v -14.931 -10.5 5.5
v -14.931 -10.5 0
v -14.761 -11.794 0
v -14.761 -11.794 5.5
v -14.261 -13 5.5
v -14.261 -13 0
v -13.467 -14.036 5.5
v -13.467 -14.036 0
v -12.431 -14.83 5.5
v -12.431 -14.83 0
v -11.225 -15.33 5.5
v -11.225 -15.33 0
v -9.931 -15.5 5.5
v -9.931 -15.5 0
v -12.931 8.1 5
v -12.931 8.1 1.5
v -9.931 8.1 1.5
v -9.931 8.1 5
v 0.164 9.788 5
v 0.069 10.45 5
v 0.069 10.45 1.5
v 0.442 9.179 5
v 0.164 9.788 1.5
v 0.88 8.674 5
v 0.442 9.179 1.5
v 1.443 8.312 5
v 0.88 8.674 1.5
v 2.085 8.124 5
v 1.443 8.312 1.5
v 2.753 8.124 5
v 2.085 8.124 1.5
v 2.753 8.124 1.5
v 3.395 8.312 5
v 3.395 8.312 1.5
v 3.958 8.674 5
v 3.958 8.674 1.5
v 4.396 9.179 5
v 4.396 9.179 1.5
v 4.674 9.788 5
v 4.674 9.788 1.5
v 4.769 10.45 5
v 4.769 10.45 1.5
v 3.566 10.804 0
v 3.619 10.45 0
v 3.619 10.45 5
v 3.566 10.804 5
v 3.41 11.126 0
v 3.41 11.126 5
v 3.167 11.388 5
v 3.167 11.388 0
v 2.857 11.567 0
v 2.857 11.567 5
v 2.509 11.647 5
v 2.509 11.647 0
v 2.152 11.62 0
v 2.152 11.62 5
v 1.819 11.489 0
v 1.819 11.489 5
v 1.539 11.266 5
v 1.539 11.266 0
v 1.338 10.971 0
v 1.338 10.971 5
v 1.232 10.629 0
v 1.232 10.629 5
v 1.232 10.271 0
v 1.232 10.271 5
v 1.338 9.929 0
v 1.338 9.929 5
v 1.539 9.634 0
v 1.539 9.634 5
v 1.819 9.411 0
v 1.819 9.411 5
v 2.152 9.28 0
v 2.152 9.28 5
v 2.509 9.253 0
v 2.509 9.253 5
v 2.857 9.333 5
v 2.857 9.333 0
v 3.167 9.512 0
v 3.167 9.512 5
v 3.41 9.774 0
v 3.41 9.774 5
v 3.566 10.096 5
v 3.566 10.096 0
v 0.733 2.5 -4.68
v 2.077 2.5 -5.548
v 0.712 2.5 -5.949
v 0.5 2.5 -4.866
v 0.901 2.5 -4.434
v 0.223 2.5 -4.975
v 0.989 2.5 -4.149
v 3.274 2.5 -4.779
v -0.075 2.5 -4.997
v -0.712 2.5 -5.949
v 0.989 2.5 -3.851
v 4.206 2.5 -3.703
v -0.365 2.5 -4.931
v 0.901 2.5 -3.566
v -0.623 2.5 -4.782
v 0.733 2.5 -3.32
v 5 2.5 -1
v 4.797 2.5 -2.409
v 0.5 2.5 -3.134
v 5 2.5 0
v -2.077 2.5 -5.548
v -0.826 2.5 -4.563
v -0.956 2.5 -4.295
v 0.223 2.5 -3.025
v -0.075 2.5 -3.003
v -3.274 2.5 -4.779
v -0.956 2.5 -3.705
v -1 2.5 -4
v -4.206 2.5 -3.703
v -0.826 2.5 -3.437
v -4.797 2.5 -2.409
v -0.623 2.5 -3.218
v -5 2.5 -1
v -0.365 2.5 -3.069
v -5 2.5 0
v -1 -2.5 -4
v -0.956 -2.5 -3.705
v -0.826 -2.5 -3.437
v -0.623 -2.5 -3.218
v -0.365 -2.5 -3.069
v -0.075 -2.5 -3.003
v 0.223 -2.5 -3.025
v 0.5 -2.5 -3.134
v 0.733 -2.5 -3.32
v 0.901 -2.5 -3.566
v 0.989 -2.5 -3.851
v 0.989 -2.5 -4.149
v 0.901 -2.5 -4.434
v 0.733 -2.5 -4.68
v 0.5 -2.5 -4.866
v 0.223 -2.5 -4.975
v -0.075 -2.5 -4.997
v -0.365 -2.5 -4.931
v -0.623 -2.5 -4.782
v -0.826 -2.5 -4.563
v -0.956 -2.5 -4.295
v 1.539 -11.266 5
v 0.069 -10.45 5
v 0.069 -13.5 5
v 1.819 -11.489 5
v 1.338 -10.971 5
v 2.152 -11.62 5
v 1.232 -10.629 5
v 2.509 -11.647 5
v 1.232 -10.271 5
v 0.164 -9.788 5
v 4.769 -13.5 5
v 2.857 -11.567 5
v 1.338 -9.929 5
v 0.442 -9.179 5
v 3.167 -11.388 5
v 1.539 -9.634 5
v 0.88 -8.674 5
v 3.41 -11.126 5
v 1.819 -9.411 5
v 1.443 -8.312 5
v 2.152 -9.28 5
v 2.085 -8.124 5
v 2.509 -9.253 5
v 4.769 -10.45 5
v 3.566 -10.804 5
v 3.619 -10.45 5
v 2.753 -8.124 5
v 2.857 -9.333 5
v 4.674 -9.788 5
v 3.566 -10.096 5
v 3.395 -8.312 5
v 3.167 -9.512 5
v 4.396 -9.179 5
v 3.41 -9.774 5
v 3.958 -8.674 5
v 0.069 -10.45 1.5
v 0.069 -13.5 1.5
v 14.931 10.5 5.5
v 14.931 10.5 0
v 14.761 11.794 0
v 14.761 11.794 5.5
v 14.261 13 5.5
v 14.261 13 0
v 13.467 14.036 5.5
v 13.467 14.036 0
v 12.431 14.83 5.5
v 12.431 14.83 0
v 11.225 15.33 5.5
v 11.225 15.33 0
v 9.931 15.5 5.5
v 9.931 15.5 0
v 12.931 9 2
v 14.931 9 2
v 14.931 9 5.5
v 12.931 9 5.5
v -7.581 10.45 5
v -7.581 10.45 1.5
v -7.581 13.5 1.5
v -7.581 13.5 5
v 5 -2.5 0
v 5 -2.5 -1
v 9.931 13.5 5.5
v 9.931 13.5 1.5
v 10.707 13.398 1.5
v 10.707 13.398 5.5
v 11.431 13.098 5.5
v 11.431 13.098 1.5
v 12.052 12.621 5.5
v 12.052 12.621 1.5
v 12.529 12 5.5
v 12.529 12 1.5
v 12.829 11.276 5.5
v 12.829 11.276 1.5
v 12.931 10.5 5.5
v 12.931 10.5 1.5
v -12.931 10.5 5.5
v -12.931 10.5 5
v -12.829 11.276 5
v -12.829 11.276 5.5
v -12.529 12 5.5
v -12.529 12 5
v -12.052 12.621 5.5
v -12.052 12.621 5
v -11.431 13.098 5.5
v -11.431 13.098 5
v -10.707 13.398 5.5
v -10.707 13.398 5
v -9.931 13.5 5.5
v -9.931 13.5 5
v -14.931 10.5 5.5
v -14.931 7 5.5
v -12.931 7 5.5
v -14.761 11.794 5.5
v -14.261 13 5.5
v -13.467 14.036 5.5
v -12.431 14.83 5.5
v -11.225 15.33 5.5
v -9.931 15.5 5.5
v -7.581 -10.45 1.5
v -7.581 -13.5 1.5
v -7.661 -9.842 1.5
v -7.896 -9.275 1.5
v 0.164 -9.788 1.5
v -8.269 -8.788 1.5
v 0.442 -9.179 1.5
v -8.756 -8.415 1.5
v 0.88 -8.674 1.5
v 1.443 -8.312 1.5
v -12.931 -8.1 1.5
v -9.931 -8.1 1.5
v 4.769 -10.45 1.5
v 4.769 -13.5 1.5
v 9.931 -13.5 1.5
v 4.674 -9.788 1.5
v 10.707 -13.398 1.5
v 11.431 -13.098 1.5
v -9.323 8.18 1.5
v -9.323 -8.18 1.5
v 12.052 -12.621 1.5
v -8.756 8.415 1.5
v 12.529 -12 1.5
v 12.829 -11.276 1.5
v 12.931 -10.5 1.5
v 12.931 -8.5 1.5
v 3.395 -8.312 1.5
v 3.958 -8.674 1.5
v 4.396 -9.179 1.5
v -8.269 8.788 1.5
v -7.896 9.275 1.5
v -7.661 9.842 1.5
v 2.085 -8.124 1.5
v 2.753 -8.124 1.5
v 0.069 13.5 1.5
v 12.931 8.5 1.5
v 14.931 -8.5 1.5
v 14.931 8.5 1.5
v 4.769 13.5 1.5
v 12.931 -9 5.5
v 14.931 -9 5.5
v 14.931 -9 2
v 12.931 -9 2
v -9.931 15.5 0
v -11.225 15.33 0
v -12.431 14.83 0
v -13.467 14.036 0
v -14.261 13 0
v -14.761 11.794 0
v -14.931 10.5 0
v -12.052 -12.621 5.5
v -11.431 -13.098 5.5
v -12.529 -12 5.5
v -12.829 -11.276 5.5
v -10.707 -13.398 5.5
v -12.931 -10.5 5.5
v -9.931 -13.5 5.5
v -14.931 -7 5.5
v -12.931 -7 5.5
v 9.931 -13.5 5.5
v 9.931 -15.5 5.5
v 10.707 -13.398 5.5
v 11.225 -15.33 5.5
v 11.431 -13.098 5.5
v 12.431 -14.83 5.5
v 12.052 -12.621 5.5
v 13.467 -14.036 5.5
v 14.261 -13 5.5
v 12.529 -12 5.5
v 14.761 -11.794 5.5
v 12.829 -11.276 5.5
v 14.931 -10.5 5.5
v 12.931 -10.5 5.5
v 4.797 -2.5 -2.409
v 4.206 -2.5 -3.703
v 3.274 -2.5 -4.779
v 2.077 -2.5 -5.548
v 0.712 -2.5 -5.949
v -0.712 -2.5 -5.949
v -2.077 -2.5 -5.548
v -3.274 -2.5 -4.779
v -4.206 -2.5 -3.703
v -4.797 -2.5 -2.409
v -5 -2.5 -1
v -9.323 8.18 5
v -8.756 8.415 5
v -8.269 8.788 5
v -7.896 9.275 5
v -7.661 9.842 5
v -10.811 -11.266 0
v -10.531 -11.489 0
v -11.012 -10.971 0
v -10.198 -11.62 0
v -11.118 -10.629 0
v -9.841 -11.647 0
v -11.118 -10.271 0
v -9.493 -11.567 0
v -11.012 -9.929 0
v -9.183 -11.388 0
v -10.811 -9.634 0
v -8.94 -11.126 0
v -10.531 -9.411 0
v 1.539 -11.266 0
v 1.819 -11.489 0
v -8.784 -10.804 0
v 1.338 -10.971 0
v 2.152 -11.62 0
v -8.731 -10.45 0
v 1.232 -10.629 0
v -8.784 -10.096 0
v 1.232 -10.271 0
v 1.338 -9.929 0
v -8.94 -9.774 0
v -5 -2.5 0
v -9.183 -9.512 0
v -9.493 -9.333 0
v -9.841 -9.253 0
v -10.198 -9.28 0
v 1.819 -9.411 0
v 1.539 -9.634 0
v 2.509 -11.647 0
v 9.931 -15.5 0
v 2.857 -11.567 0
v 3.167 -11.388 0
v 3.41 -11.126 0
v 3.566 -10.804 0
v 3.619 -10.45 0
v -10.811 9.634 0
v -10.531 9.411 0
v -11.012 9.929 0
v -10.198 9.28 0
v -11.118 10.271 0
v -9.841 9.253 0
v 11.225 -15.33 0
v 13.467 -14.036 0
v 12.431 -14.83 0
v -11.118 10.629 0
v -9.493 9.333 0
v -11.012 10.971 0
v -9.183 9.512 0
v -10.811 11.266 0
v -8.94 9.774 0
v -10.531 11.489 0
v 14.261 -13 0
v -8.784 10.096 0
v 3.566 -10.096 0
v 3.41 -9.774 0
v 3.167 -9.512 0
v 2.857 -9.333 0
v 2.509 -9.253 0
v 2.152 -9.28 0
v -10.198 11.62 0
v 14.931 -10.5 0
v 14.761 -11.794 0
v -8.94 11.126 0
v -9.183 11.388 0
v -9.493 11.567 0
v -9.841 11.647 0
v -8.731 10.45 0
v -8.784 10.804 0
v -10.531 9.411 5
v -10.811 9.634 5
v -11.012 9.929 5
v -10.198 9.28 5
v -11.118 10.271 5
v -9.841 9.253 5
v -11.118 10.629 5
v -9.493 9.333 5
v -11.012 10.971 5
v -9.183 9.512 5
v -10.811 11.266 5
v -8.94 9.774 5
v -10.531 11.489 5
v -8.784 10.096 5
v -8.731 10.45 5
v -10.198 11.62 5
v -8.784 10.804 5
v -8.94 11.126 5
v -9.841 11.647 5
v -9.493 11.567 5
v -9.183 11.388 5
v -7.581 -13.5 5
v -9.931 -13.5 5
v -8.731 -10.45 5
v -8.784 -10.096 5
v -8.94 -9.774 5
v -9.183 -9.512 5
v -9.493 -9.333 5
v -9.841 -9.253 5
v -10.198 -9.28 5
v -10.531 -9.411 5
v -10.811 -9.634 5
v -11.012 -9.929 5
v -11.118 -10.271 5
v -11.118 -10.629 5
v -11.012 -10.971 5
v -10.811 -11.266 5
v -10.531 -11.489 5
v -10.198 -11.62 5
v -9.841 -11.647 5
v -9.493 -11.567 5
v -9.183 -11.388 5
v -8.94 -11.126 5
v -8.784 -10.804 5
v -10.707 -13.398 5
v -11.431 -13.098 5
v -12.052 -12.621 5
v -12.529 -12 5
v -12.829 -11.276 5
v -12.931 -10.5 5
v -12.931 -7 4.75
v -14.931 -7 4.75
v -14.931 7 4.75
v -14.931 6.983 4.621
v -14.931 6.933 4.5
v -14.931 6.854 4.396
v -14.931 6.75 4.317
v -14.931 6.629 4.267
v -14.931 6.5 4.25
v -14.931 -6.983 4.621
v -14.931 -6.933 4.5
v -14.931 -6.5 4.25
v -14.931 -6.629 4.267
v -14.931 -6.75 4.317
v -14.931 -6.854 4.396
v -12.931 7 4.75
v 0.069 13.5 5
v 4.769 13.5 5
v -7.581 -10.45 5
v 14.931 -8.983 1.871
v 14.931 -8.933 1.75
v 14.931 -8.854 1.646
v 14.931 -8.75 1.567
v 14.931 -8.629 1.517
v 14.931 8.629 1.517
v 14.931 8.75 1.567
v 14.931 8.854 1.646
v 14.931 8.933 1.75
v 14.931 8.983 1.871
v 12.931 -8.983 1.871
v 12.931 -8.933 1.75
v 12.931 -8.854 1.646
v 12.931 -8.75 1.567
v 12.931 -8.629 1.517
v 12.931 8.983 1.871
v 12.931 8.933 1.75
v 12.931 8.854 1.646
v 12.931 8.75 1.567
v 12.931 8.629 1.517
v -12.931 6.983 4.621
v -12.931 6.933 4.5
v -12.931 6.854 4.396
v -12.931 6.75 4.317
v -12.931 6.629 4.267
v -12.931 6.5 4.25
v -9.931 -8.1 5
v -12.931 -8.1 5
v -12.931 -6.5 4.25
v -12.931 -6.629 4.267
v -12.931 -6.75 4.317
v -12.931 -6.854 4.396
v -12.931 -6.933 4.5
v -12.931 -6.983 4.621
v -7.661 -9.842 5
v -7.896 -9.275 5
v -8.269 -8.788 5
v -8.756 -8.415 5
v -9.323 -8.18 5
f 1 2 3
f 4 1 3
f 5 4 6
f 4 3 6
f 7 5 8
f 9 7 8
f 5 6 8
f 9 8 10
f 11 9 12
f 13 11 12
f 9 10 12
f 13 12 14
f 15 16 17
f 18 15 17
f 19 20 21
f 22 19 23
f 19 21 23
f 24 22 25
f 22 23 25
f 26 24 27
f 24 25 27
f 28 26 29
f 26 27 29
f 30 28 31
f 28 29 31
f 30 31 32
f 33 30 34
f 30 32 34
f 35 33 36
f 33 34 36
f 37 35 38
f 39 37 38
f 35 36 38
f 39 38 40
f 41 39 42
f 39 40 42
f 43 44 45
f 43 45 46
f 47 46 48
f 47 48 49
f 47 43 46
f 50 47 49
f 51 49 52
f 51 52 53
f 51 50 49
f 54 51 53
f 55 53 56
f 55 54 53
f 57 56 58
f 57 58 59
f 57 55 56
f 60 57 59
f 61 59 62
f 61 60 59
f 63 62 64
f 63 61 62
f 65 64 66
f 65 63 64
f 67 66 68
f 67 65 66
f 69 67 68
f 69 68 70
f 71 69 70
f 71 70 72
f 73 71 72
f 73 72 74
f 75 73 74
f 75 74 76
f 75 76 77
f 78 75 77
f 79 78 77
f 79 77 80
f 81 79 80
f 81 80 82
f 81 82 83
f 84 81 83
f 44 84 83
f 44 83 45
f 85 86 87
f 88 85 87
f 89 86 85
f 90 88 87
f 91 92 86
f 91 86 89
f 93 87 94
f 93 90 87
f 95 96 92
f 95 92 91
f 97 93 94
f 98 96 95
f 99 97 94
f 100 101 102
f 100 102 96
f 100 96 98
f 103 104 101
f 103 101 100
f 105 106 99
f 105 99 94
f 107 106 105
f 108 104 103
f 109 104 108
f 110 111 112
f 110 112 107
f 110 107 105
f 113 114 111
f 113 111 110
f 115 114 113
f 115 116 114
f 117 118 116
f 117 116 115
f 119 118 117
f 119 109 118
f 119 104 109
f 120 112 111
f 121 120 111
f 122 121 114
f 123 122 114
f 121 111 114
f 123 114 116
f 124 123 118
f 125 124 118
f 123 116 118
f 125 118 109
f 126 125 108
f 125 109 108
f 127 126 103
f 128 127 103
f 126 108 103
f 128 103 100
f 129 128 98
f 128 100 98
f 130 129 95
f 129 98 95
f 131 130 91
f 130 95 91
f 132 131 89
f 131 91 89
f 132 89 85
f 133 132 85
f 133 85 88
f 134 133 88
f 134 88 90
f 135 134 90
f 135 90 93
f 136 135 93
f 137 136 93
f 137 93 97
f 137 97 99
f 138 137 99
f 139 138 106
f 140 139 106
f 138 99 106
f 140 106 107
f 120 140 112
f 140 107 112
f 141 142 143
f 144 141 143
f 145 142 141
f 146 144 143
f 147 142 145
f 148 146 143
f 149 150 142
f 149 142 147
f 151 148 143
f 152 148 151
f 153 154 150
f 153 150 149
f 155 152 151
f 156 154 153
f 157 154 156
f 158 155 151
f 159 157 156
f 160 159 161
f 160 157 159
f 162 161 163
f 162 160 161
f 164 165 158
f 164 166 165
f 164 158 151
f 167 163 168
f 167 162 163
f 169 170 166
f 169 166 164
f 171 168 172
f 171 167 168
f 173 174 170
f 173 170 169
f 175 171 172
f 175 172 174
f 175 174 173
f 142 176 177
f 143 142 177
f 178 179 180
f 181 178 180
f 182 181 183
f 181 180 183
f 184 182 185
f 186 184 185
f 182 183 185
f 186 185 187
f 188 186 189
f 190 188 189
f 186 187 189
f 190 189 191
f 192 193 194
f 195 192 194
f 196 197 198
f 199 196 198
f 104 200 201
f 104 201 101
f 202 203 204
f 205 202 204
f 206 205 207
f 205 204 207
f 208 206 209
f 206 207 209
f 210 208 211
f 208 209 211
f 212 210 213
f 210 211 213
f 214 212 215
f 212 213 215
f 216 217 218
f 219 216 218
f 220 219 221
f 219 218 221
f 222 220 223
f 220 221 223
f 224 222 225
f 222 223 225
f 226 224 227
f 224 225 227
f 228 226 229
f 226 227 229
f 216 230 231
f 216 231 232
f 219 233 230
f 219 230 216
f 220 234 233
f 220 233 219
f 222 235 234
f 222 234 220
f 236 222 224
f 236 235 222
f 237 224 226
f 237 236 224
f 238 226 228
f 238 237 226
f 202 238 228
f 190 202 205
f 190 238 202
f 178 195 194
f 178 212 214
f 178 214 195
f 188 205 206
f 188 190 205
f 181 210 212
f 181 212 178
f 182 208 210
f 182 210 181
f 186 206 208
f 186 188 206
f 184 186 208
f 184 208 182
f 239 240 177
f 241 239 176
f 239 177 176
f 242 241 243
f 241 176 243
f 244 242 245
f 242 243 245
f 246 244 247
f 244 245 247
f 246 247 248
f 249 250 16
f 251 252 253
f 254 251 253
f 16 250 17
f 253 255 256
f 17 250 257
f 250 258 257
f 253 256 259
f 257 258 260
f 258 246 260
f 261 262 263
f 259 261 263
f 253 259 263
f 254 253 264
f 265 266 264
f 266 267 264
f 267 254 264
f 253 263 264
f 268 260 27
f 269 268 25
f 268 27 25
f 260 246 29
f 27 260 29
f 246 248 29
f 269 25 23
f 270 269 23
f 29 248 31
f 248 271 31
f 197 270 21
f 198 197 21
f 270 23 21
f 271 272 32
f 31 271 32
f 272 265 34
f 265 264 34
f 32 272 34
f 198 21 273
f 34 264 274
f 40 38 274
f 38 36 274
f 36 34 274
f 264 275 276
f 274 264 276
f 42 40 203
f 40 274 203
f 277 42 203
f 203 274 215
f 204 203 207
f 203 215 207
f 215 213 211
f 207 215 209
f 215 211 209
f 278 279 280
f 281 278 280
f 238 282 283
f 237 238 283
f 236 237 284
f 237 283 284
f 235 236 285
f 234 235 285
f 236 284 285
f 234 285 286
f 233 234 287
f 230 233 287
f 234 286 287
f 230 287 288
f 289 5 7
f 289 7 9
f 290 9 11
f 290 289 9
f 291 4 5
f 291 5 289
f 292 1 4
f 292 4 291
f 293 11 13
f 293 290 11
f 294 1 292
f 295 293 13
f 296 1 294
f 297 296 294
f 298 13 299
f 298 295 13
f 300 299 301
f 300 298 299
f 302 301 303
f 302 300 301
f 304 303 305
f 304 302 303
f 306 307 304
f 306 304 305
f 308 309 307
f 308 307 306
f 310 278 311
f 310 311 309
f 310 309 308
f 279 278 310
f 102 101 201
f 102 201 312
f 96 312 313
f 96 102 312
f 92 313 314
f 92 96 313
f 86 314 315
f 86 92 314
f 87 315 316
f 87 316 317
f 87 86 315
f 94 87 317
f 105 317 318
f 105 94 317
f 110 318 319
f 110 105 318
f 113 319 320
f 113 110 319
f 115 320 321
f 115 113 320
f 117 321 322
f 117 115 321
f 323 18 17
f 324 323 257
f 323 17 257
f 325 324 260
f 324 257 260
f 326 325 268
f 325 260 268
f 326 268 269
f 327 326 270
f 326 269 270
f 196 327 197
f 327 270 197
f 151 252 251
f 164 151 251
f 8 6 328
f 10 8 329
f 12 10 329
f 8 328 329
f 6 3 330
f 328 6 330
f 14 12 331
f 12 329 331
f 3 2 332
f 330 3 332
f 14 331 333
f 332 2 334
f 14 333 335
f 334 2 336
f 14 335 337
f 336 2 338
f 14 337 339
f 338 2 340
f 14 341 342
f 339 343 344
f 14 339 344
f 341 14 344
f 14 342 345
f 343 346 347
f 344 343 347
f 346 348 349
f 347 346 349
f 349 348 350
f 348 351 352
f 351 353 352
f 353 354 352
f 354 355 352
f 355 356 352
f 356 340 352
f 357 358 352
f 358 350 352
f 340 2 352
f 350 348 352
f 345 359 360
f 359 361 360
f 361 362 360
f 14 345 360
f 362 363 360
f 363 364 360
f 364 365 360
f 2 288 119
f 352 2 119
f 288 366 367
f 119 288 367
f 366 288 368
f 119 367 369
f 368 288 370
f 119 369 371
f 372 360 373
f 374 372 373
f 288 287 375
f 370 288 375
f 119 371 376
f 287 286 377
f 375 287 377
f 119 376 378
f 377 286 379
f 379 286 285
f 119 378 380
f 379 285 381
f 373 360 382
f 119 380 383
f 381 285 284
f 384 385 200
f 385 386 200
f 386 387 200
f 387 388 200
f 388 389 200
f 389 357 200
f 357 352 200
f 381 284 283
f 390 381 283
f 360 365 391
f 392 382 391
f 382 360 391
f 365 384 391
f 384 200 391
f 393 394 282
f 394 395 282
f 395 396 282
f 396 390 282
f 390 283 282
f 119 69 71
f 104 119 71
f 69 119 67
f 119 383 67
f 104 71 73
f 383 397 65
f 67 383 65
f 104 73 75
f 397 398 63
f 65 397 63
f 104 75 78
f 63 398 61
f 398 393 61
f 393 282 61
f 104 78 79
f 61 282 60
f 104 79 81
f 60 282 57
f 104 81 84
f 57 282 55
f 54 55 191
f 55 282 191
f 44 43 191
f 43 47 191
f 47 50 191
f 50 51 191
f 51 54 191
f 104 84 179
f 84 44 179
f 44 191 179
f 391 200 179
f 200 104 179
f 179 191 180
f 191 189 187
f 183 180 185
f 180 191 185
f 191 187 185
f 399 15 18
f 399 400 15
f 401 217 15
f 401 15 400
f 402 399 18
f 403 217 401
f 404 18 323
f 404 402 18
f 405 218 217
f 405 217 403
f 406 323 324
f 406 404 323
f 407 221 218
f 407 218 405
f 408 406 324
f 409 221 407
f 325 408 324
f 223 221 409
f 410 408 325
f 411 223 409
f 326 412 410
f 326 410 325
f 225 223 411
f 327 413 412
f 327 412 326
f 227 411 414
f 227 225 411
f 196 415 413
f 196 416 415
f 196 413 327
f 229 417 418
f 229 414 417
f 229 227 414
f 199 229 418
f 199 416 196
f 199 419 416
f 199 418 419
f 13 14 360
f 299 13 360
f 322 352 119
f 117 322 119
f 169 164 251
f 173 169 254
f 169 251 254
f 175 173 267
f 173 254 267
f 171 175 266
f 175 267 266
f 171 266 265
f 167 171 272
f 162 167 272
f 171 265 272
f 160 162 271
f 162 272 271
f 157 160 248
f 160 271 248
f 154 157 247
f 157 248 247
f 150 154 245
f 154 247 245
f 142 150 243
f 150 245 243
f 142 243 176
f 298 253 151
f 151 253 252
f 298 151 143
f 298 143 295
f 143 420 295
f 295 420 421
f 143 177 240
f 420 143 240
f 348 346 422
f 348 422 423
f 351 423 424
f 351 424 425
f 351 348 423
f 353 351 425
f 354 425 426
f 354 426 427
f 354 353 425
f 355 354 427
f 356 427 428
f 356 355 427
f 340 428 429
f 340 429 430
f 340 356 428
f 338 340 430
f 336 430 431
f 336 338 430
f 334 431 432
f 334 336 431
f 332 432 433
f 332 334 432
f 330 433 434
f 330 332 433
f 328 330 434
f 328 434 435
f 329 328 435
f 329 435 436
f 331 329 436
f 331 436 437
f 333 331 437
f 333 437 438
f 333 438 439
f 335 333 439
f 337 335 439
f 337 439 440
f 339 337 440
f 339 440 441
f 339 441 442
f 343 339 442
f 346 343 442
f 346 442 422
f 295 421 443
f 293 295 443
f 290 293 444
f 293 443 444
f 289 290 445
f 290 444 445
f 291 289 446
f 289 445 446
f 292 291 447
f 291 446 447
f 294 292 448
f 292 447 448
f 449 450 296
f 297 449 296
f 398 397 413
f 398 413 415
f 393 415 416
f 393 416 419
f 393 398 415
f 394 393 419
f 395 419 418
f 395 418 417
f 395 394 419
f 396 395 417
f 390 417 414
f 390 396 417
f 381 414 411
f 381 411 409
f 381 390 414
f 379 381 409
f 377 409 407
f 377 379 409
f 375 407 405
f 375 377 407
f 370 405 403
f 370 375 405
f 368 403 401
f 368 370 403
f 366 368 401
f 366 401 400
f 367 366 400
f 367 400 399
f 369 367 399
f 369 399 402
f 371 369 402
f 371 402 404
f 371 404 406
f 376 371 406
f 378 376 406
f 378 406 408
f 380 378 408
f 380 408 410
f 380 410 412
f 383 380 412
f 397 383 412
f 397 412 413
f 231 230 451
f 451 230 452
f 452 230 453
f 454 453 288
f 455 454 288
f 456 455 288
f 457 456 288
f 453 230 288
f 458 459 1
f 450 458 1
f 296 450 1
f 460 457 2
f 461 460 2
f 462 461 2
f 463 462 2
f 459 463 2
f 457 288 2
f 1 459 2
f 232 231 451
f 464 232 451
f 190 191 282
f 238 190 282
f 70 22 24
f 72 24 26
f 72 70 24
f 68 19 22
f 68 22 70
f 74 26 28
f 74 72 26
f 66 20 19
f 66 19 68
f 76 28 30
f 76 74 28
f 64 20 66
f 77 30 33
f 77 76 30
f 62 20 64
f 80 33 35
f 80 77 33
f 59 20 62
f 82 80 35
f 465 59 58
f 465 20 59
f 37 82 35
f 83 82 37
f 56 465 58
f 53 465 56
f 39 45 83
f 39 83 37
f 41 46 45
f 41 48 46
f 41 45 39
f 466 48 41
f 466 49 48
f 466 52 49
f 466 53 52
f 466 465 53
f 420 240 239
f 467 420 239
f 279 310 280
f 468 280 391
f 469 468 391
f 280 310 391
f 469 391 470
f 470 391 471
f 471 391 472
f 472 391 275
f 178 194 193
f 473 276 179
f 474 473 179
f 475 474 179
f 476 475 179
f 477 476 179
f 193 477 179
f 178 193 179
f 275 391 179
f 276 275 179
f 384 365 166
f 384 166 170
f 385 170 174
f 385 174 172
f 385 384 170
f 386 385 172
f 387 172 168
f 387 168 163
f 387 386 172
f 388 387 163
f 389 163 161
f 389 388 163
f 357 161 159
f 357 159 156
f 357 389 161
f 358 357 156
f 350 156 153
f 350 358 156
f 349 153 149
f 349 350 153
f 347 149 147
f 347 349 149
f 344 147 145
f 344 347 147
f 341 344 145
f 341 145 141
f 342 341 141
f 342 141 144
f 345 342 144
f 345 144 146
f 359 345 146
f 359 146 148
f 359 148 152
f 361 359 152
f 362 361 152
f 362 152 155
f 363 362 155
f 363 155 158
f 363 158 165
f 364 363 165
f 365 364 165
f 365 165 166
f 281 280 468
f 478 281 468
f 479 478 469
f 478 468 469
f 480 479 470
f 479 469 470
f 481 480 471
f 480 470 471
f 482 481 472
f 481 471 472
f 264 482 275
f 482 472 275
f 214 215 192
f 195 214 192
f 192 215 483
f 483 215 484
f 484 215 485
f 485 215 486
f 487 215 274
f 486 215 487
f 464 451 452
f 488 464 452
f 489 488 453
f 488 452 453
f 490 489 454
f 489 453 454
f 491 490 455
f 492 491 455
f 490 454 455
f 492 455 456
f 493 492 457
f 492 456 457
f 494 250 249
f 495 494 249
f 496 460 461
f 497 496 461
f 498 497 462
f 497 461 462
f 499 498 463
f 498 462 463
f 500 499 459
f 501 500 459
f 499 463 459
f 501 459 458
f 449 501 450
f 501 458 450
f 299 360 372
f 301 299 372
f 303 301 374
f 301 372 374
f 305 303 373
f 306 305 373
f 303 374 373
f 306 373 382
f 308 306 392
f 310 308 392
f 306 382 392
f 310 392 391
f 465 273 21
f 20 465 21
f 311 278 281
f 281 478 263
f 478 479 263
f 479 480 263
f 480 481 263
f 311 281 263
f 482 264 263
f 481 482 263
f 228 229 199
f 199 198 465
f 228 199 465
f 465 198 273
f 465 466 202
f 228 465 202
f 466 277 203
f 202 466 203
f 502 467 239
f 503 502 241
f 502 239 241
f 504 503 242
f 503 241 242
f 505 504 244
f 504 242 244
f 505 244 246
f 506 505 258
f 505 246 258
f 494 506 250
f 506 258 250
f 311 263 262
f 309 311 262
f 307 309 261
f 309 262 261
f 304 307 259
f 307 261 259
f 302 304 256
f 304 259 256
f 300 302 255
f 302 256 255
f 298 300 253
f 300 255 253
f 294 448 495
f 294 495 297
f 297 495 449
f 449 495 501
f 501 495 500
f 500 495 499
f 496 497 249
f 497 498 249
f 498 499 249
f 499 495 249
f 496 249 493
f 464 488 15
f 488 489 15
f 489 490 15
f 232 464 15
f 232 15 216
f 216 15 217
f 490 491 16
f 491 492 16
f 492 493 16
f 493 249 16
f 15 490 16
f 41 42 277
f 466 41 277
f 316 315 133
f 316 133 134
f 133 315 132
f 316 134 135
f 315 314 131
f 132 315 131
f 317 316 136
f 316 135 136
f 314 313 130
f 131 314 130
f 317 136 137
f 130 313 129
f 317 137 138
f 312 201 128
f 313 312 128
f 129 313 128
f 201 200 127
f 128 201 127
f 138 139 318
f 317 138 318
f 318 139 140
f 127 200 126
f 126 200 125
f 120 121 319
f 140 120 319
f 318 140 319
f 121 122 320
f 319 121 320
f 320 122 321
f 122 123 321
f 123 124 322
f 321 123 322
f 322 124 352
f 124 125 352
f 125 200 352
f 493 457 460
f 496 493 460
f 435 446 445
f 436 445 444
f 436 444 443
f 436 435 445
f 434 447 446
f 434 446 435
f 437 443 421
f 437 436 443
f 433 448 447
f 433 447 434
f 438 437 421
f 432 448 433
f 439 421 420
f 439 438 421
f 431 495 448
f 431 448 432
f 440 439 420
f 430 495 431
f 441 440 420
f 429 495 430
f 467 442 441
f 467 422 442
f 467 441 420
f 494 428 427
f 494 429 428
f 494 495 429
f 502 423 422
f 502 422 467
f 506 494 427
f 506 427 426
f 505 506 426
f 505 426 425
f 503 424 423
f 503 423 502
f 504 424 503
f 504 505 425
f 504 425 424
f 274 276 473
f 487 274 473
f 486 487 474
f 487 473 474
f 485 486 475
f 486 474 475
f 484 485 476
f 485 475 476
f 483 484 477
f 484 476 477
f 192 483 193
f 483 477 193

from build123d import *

# Parameters (mm, degrees)
F0_R      = 1.2
F1_DEPTH  = 1.5
F2_DEPTH  = 5
F3_DEPTH  = 5.5
F5_DEPTH  = 2
F7_DEPTH  = 2
F8_W      = 10
F8_H      = 5
F9_DEPTH  = 1
F10_R     = 1
F11_DEPTH = 5


# Not quite as in the source:
# - a feature names something its author has since deleted; it is built from what else it names


with BuildPart() as f1:
    # F0 (on Top) → F1 (new body)
    with BuildSketch(Plane.XY):
        with BuildLine():
            Line((14.9310000289, -10.5), (14.9310000289, 10.5))
            ThreePointArc((14.9310000289, 10.5), (13.4665339264, 14.0355339264), (9.931, 15.5000000289))
            Line((9.931, 15.5000000289), (-9.931, 15.5000000289))
            ThreePointArc((-9.931, 15.5000000289), (-13.4665339264, 14.0355339264), (-14.9310000289, 10.5))
            Line((-14.9310000289, 10.5), (-14.9310000289, -10.5))
            ThreePointArc((-14.9310000289, -10.5), (-13.4665339264, -14.0355339264), (-9.931, -15.5000000289))
            Line((-9.931, -15.5000000289), (9.931, -15.5000000289))
            ThreePointArc((9.931, -15.5000000289), (13.4665339264, -14.0355339264), (14.9310000289, -10.5))
        make_face()
        with BuildLine():
            Line((-9.931, 13.5000000289), (-7.581, 13.5000000289))
            Line((-7.581, 13.5000000289), (0.069, 13.5000000289))
            Line((0.069, 13.5000000289), (4.769, 13.5000000289))
            Line((4.769, 13.5000000289), (9.931, 13.5000000289))
            ThreePointArc((9.931, 13.5000000289), (12.052320364, 12.621320364), (12.9310000289, 10.5))
            Line((12.9310000289, 10.5), (12.9310000289, -10.5))
            ThreePointArc((12.9310000289, -10.5), (12.052320364, -12.621320364), (9.931, -13.5000000289))
            Line((9.931, -13.5000000289), (4.769, -13.5000000289))
            Line((4.769, -13.5000000289), (0.069, -13.5000000289))
            Line((0.069, -13.5000000289), (-7.581, -13.5000000289))
            Line((-7.581, -13.5000000289), (-9.931, -13.5000000289))
            ThreePointArc((-9.931, -13.5000000289), (-12.052320364, -12.621320364), (-12.9310000289, -10.5))
            Line((-12.9310000289, -10.5), (-12.9310000289, -8.1))
            Line((-12.9310000289, -8.1), (-12.9310000289, 8.1))
            Line((-12.9310000289, 8.1), (-12.9310000289, 10.5))
            ThreePointArc((-12.9310000289, 10.5), (-12.052320364, 12.621320364), (-9.931, 13.5000000289))
        make_face(mode=Mode.SUBTRACT)
        with BuildLine():
            ThreePointArc((4.769, -10.45), (2.419, -8.1), (0.069, -10.45))
            ThreePointArc((0.069, -10.45), (2.419, -12.8), (4.769, -10.45))
        make_face()
        with Locations((2.419, -10.45)):
            Circle(F0_R, mode=Mode.SUBTRACT)
        with BuildLine():
            ThreePointArc((4.769, 10.45), (2.419, 12.8), (0.069, 10.45))
            ThreePointArc((0.069, 10.45), (2.419, 8.1), (4.769, 10.45))
        make_face()
        with Locations((2.419, 10.45)):
            Circle(F0_R, mode=Mode.SUBTRACT)
        with BuildLine():
            ThreePointArc((-9.931, 8.1), (-11.5927009358, 12.1117009358), (-7.581, 10.45))
            Line((-7.581, 10.45), (-7.581, 13.5000000289))
            Line((-7.581, 13.5000000289), (-9.931, 13.5000000289))
            ThreePointArc((-9.931, 13.5000000289), (-12.052320364, 12.621320364), (-12.9310000289, 10.5))
            Line((-12.9310000289, 10.5), (-12.9310000289, 8.1))
            Line((-12.9310000289, 8.1), (-9.931, 8.1))
        make_face()
        with BuildLine():
            Line((-9.931, -8.1), (-12.9310000289, -8.1))
            Line((-12.9310000289, -8.1), (-12.9310000289, -10.5))
            ThreePointArc((-12.9310000289, -10.5), (-12.052320364, -12.621320364), (-9.931, -13.5000000289))
            Line((-9.931, -13.5000000289), (-7.581, -13.5000000289))
            Line((-7.581, -13.5000000289), (-7.581, -10.45))
            ThreePointArc((-7.581, -10.45), (-11.5927009358, -12.1117009358), (-9.931, -8.1))
        make_face()
        with BuildLine():
            ThreePointArc((-7.581, -10.45), (-8.2692990642, -8.7882990642), (-9.931, -8.1))
            ThreePointArc((-9.931, -8.1), (-11.5927009358, -12.1117009358), (-7.581, -10.45))
        make_face()
        with Locations((-9.931, -10.45)):
            Circle(F0_R, mode=Mode.SUBTRACT)
        with BuildLine():
            Line((0.069, -10.45), (0.069, -13.5000000289))
            Line((0.069, -13.5000000289), (4.769, -13.5000000289))
            Line((4.769, -13.5000000289), (4.769, -10.45))
            ThreePointArc((4.769, -10.45), (2.419, -12.8), (0.069, -10.45))
        make_face()
        with BuildLine():
            ThreePointArc((-9.931, 8.1), (-8.2692990642, 8.7882990642), (-7.581, 10.45))
            ThreePointArc((-7.581, 10.45), (-11.5927009358, 12.1117009358), (-9.931, 8.1))
        make_face()
        with Locations((-9.931, 10.45)):
            Circle(F0_R, mode=Mode.SUBTRACT)
        with BuildLine():
            Line((4.769, 13.5000000289), (0.069, 13.5000000289))
            Line((0.069, 13.5000000289), (0.069, 10.45))
            ThreePointArc((0.069, 10.45), (2.419, 12.8), (4.769, 10.45))
            Line((4.769, 10.45), (4.769, 13.5000000289))
        make_face()
        with BuildLine():
            Line((-7.581, 13.5000000289), (-7.581, 10.45))
            ThreePointArc((-7.581, 10.45), (-8.2692990642, 8.7882990642), (-9.931, 8.1))
            Line((-9.931, 8.1), (-12.9310000289, 8.1))
            Line((-12.9310000289, 8.1), (-12.9310000289, -8.1))
            Line((-12.9310000289, -8.1), (-9.931, -8.1))
            ThreePointArc((-9.931, -8.1), (-8.2692990642, -8.7882990642), (-7.581, -10.45))
            Line((-7.581, -10.45), (-7.581, -13.5000000289))
            Line((-7.581, -13.5000000289), (0.069, -13.5000000289))
            Line((0.069, -13.5000000289), (0.069, -10.45))
            ThreePointArc((0.069, -10.45), (2.419, -8.1), (4.769, -10.45))
            Line((4.769, -10.45), (4.769, -13.5000000289))
            Line((4.769, -13.5000000289), (9.931, -13.5000000289))
            ThreePointArc((9.931, -13.5000000289), (12.052320364, -12.621320364), (12.9310000289, -10.5))
            Line((12.9310000289, -10.5), (12.9310000289, 10.5))
            ThreePointArc((12.9310000289, 10.5), (12.052320364, 12.621320364), (9.931, 13.5000000289))
            Line((9.931, 13.5000000289), (4.769, 13.5000000289))
            Line((4.769, 13.5000000289), (4.769, 10.45))
            ThreePointArc((4.769, 10.45), (2.419, 8.1), (0.069, 10.45))
            Line((0.069, 10.45), (0.069, 13.5000000289))
            Line((0.069, 13.5000000289), (-7.581, 13.5000000289))
        make_face()
    extrude(amount=F1_DEPTH)

    # F0 (on Top) → F2 (join)
    with BuildSketch(Plane.XY):
        with BuildLine():
            ThreePointArc((-9.931, 8.1), (-11.5927009358, 12.1117009358), (-7.581, 10.45))
            Line((-7.581, 10.45), (-7.581, 13.5000000289))
            Line((-7.581, 13.5000000289), (-9.931, 13.5000000289))
            ThreePointArc((-9.931, 13.5000000289), (-12.052320364, 12.621320364), (-12.9310000289, 10.5))
            Line((-12.9310000289, 10.5), (-12.9310000289, 8.1))
            Line((-12.9310000289, 8.1), (-9.931, 8.1))
        make_face()
        with BuildLine():
            ThreePointArc((-9.931, 8.1), (-8.2692990642, 8.7882990642), (-7.581, 10.45))
            ThreePointArc((-7.581, 10.45), (-11.5927009358, 12.1117009358), (-9.931, 8.1))
        make_face()
        with Locations((-9.931, 10.45)):
            Circle(F0_R, mode=Mode.SUBTRACT)
        with BuildLine():
            ThreePointArc((4.769, 10.45), (2.419, 12.8), (0.069, 10.45))
            ThreePointArc((0.069, 10.45), (2.419, 8.1), (4.769, 10.45))
        make_face()
        with Locations((2.419, 10.45)):
            Circle(F0_R, mode=Mode.SUBTRACT)
        with BuildLine():
            Line((4.769, 13.5000000289), (0.069, 13.5000000289))
            Line((0.069, 13.5000000289), (0.069, 10.45))
            ThreePointArc((0.069, 10.45), (2.419, 12.8), (4.769, 10.45))
            Line((4.769, 10.45), (4.769, 13.5000000289))
        make_face()
        with BuildLine():
            ThreePointArc((4.769, -10.45), (2.419, -8.1), (0.069, -10.45))
            ThreePointArc((0.069, -10.45), (2.419, -12.8), (4.769, -10.45))
        make_face()
        with Locations((2.419, -10.45)):
            Circle(F0_R, mode=Mode.SUBTRACT)
        with BuildLine():
            Line((0.069, -10.45), (0.069, -13.5000000289))
            Line((0.069, -13.5000000289), (4.769, -13.5000000289))
            Line((4.769, -13.5000000289), (4.769, -10.45))
            ThreePointArc((4.769, -10.45), (2.419, -12.8), (0.069, -10.45))
        make_face()
        with BuildLine():
            ThreePointArc((-7.581, -10.45), (-8.2692990642, -8.7882990642), (-9.931, -8.1))
            ThreePointArc((-9.931, -8.1), (-11.5927009358, -12.1117009358), (-7.581, -10.45))
        make_face()
        with Locations((-9.931, -10.45)):
            Circle(F0_R, mode=Mode.SUBTRACT)
        with BuildLine():
            Line((-9.931, -8.1), (-12.9310000289, -8.1))
            Line((-12.9310000289, -8.1), (-12.9310000289, -10.5))
            ThreePointArc((-12.9310000289, -10.5), (-12.052320364, -12.621320364), (-9.931, -13.5000000289))
            Line((-9.931, -13.5000000289), (-7.581, -13.5000000289))
            Line((-7.581, -13.5000000289), (-7.581, -10.45))
            ThreePointArc((-7.581, -10.45), (-11.5927009358, -12.1117009358), (-9.931, -8.1))
        make_face()
    extrude(amount=F2_DEPTH)

    # F0 (on Top) → F3 (join)
    with BuildSketch(Plane.XY):
        with BuildLine():
            Line((14.9310000289, -10.5), (14.9310000289, 10.5))
            ThreePointArc((14.9310000289, 10.5), (13.4665339264, 14.0355339264), (9.931, 15.5000000289))
            Line((9.931, 15.5000000289), (-9.931, 15.5000000289))
            ThreePointArc((-9.931, 15.5000000289), (-13.4665339264, 14.0355339264), (-14.9310000289, 10.5))
            Line((-14.9310000289, 10.5), (-14.9310000289, -10.5))
            ThreePointArc((-14.9310000289, -10.5), (-13.4665339264, -14.0355339264), (-9.931, -15.5000000289))
            Line((-9.931, -15.5000000289), (9.931, -15.5000000289))
            ThreePointArc((9.931, -15.5000000289), (13.4665339264, -14.0355339264), (14.9310000289, -10.5))
        make_face()
        with BuildLine():
            Line((-9.931, 13.5000000289), (-7.581, 13.5000000289))
            Line((-7.581, 13.5000000289), (0.069, 13.5000000289))
            Line((0.069, 13.5000000289), (4.769, 13.5000000289))
            Line((4.769, 13.5000000289), (9.931, 13.5000000289))
            ThreePointArc((9.931, 13.5000000289), (12.052320364, 12.621320364), (12.9310000289, 10.5))
            Line((12.9310000289, 10.5), (12.9310000289, -10.5))
            ThreePointArc((12.9310000289, -10.5), (12.052320364, -12.621320364), (9.931, -13.5000000289))
            Line((9.931, -13.5000000289), (4.769, -13.5000000289))
            Line((4.769, -13.5000000289), (0.069, -13.5000000289))
            Line((0.069, -13.5000000289), (-7.581, -13.5000000289))
            Line((-7.581, -13.5000000289), (-9.931, -13.5000000289))
            ThreePointArc((-9.931, -13.5000000289), (-12.052320364, -12.621320364), (-12.9310000289, -10.5))
            Line((-12.9310000289, -10.5), (-12.9310000289, -8.1))
            Line((-12.9310000289, -8.1), (-12.9310000289, 8.1))
            Line((-12.9310000289, 8.1), (-12.9310000289, 10.5))
            ThreePointArc((-12.9310000289, 10.5), (-12.052320364, 12.621320364), (-9.931, 13.5000000289))
        make_face(mode=Mode.SUBTRACT)
    extrude(amount=F3_DEPTH)

    # F4 (on face) → F5 (cut)
    with BuildSketch(Plane(origin=(-14.9310000289, 0, 0), x_dir=(0, -1, 0), z_dir=(-1, 0, 0))):
        with BuildLine():
            Line((7, 5.5), (-7, 5.5))
            Line((-7, 5.5), (-7, 4.75))
            ThreePointArc((-7, 4.75), (-6.8535533906, 4.3964466094), (-6.5, 4.25))
            Line((-6.5, 4.25), (6.5, 4.25))
            ThreePointArc((6.5, 4.25), (6.8535533906, 4.3964466094), (7, 4.75))
            Line((7, 4.75), (7, 5.5))
        make_face()
    extrude(amount=-F5_DEPTH, mode=Mode.SUBTRACT)

    # F6 (on face) → F7 (cut)
    with BuildSketch(Plane.YZ.offset(14.9310000289)):
        with BuildLine():
            Line((9, 2), (9, 5.5))
            Line((9, 5.5), (-9, 5.5))
            Line((-9, 5.5), (-9, 2))
            ThreePointArc((-9, 2), (-8.8535533906, 1.6464466094), (-8.5, 1.5))
            Line((-8.5, 1.5), (8.5, 1.5))
            ThreePointArc((8.5, 1.5), (8.8535533906, 1.6464466094), (9, 2))
        make_face()
    extrude(amount=-F7_DEPTH, mode=Mode.SUBTRACT)

    # F8 (on face) → F9 (join)
    with BuildSketch(Plane.XY):
        Rectangle(F8_W, F8_H)
    extrude(amount=-F9_DEPTH)

    # F10 (on face) → F11 (join)
    with BuildSketch(Plane(origin=(0, 2.5, 0), x_dir=(-1, 0, 0), z_dir=(0, 1, 0))):
        with BuildLine():
            Line((5, -1), (-5, -1))
            ThreePointArc((-5, -1), (0, -6), (5, -1))
        make_face()
        with Locations((0, -4)):
            Circle(F10_R, mode=Mode.SUBTRACT)
    extrude(amount=-F11_DEPTH)


solid = f1.part
